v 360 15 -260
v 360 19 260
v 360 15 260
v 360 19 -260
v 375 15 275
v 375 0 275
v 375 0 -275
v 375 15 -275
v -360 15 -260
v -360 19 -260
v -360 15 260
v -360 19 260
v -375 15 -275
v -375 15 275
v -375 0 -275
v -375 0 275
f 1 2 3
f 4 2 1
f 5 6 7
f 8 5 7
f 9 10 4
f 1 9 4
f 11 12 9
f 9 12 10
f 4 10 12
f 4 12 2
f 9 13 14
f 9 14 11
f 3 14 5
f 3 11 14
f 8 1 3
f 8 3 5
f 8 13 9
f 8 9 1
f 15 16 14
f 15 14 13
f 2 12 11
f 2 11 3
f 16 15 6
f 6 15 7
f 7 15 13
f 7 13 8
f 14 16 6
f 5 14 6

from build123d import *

# Parameters (mm, degrees)
SKETCH1_W           = 750
SKETCH1_H           = 550
BOSS_EXTRUDE1_DEPTH = 19
SKETCH3_W           = 750
SKETCH3_H           = 550
SKETCH3_W_2         = 720
SKETCH3_H_2         = 520
CUT_EXTRUDE2_DEPTH  = 4


with BuildPart() as part:
    # Sketch1 → Boss-Extrude1 (new body)
    with BuildSketch(Plane(origin=(0, 0, 0), x_dir=(1, 0, 0), z_dir=(0, 1, 0))):
        Rectangle(SKETCH1_W, SKETCH1_H)
    extrude(amount=BOSS_EXTRUDE1_DEPTH)

    # Sketch3 → Cut-Extrude2 (cut)
    with BuildSketch(Plane(origin=(0, 19, 0), x_dir=(1, 0, 0), z_dir=(0, 1, 0))):
        Rectangle(SKETCH3_W, SKETCH3_H)
        Rectangle(SKETCH3_W_2, SKETCH3_H_2, mode=Mode.SUBTRACT)
    extrude(amount=-CUT_EXTRUDE2_DEPTH, mode=Mode.SUBTRACT)


solid = part.part
